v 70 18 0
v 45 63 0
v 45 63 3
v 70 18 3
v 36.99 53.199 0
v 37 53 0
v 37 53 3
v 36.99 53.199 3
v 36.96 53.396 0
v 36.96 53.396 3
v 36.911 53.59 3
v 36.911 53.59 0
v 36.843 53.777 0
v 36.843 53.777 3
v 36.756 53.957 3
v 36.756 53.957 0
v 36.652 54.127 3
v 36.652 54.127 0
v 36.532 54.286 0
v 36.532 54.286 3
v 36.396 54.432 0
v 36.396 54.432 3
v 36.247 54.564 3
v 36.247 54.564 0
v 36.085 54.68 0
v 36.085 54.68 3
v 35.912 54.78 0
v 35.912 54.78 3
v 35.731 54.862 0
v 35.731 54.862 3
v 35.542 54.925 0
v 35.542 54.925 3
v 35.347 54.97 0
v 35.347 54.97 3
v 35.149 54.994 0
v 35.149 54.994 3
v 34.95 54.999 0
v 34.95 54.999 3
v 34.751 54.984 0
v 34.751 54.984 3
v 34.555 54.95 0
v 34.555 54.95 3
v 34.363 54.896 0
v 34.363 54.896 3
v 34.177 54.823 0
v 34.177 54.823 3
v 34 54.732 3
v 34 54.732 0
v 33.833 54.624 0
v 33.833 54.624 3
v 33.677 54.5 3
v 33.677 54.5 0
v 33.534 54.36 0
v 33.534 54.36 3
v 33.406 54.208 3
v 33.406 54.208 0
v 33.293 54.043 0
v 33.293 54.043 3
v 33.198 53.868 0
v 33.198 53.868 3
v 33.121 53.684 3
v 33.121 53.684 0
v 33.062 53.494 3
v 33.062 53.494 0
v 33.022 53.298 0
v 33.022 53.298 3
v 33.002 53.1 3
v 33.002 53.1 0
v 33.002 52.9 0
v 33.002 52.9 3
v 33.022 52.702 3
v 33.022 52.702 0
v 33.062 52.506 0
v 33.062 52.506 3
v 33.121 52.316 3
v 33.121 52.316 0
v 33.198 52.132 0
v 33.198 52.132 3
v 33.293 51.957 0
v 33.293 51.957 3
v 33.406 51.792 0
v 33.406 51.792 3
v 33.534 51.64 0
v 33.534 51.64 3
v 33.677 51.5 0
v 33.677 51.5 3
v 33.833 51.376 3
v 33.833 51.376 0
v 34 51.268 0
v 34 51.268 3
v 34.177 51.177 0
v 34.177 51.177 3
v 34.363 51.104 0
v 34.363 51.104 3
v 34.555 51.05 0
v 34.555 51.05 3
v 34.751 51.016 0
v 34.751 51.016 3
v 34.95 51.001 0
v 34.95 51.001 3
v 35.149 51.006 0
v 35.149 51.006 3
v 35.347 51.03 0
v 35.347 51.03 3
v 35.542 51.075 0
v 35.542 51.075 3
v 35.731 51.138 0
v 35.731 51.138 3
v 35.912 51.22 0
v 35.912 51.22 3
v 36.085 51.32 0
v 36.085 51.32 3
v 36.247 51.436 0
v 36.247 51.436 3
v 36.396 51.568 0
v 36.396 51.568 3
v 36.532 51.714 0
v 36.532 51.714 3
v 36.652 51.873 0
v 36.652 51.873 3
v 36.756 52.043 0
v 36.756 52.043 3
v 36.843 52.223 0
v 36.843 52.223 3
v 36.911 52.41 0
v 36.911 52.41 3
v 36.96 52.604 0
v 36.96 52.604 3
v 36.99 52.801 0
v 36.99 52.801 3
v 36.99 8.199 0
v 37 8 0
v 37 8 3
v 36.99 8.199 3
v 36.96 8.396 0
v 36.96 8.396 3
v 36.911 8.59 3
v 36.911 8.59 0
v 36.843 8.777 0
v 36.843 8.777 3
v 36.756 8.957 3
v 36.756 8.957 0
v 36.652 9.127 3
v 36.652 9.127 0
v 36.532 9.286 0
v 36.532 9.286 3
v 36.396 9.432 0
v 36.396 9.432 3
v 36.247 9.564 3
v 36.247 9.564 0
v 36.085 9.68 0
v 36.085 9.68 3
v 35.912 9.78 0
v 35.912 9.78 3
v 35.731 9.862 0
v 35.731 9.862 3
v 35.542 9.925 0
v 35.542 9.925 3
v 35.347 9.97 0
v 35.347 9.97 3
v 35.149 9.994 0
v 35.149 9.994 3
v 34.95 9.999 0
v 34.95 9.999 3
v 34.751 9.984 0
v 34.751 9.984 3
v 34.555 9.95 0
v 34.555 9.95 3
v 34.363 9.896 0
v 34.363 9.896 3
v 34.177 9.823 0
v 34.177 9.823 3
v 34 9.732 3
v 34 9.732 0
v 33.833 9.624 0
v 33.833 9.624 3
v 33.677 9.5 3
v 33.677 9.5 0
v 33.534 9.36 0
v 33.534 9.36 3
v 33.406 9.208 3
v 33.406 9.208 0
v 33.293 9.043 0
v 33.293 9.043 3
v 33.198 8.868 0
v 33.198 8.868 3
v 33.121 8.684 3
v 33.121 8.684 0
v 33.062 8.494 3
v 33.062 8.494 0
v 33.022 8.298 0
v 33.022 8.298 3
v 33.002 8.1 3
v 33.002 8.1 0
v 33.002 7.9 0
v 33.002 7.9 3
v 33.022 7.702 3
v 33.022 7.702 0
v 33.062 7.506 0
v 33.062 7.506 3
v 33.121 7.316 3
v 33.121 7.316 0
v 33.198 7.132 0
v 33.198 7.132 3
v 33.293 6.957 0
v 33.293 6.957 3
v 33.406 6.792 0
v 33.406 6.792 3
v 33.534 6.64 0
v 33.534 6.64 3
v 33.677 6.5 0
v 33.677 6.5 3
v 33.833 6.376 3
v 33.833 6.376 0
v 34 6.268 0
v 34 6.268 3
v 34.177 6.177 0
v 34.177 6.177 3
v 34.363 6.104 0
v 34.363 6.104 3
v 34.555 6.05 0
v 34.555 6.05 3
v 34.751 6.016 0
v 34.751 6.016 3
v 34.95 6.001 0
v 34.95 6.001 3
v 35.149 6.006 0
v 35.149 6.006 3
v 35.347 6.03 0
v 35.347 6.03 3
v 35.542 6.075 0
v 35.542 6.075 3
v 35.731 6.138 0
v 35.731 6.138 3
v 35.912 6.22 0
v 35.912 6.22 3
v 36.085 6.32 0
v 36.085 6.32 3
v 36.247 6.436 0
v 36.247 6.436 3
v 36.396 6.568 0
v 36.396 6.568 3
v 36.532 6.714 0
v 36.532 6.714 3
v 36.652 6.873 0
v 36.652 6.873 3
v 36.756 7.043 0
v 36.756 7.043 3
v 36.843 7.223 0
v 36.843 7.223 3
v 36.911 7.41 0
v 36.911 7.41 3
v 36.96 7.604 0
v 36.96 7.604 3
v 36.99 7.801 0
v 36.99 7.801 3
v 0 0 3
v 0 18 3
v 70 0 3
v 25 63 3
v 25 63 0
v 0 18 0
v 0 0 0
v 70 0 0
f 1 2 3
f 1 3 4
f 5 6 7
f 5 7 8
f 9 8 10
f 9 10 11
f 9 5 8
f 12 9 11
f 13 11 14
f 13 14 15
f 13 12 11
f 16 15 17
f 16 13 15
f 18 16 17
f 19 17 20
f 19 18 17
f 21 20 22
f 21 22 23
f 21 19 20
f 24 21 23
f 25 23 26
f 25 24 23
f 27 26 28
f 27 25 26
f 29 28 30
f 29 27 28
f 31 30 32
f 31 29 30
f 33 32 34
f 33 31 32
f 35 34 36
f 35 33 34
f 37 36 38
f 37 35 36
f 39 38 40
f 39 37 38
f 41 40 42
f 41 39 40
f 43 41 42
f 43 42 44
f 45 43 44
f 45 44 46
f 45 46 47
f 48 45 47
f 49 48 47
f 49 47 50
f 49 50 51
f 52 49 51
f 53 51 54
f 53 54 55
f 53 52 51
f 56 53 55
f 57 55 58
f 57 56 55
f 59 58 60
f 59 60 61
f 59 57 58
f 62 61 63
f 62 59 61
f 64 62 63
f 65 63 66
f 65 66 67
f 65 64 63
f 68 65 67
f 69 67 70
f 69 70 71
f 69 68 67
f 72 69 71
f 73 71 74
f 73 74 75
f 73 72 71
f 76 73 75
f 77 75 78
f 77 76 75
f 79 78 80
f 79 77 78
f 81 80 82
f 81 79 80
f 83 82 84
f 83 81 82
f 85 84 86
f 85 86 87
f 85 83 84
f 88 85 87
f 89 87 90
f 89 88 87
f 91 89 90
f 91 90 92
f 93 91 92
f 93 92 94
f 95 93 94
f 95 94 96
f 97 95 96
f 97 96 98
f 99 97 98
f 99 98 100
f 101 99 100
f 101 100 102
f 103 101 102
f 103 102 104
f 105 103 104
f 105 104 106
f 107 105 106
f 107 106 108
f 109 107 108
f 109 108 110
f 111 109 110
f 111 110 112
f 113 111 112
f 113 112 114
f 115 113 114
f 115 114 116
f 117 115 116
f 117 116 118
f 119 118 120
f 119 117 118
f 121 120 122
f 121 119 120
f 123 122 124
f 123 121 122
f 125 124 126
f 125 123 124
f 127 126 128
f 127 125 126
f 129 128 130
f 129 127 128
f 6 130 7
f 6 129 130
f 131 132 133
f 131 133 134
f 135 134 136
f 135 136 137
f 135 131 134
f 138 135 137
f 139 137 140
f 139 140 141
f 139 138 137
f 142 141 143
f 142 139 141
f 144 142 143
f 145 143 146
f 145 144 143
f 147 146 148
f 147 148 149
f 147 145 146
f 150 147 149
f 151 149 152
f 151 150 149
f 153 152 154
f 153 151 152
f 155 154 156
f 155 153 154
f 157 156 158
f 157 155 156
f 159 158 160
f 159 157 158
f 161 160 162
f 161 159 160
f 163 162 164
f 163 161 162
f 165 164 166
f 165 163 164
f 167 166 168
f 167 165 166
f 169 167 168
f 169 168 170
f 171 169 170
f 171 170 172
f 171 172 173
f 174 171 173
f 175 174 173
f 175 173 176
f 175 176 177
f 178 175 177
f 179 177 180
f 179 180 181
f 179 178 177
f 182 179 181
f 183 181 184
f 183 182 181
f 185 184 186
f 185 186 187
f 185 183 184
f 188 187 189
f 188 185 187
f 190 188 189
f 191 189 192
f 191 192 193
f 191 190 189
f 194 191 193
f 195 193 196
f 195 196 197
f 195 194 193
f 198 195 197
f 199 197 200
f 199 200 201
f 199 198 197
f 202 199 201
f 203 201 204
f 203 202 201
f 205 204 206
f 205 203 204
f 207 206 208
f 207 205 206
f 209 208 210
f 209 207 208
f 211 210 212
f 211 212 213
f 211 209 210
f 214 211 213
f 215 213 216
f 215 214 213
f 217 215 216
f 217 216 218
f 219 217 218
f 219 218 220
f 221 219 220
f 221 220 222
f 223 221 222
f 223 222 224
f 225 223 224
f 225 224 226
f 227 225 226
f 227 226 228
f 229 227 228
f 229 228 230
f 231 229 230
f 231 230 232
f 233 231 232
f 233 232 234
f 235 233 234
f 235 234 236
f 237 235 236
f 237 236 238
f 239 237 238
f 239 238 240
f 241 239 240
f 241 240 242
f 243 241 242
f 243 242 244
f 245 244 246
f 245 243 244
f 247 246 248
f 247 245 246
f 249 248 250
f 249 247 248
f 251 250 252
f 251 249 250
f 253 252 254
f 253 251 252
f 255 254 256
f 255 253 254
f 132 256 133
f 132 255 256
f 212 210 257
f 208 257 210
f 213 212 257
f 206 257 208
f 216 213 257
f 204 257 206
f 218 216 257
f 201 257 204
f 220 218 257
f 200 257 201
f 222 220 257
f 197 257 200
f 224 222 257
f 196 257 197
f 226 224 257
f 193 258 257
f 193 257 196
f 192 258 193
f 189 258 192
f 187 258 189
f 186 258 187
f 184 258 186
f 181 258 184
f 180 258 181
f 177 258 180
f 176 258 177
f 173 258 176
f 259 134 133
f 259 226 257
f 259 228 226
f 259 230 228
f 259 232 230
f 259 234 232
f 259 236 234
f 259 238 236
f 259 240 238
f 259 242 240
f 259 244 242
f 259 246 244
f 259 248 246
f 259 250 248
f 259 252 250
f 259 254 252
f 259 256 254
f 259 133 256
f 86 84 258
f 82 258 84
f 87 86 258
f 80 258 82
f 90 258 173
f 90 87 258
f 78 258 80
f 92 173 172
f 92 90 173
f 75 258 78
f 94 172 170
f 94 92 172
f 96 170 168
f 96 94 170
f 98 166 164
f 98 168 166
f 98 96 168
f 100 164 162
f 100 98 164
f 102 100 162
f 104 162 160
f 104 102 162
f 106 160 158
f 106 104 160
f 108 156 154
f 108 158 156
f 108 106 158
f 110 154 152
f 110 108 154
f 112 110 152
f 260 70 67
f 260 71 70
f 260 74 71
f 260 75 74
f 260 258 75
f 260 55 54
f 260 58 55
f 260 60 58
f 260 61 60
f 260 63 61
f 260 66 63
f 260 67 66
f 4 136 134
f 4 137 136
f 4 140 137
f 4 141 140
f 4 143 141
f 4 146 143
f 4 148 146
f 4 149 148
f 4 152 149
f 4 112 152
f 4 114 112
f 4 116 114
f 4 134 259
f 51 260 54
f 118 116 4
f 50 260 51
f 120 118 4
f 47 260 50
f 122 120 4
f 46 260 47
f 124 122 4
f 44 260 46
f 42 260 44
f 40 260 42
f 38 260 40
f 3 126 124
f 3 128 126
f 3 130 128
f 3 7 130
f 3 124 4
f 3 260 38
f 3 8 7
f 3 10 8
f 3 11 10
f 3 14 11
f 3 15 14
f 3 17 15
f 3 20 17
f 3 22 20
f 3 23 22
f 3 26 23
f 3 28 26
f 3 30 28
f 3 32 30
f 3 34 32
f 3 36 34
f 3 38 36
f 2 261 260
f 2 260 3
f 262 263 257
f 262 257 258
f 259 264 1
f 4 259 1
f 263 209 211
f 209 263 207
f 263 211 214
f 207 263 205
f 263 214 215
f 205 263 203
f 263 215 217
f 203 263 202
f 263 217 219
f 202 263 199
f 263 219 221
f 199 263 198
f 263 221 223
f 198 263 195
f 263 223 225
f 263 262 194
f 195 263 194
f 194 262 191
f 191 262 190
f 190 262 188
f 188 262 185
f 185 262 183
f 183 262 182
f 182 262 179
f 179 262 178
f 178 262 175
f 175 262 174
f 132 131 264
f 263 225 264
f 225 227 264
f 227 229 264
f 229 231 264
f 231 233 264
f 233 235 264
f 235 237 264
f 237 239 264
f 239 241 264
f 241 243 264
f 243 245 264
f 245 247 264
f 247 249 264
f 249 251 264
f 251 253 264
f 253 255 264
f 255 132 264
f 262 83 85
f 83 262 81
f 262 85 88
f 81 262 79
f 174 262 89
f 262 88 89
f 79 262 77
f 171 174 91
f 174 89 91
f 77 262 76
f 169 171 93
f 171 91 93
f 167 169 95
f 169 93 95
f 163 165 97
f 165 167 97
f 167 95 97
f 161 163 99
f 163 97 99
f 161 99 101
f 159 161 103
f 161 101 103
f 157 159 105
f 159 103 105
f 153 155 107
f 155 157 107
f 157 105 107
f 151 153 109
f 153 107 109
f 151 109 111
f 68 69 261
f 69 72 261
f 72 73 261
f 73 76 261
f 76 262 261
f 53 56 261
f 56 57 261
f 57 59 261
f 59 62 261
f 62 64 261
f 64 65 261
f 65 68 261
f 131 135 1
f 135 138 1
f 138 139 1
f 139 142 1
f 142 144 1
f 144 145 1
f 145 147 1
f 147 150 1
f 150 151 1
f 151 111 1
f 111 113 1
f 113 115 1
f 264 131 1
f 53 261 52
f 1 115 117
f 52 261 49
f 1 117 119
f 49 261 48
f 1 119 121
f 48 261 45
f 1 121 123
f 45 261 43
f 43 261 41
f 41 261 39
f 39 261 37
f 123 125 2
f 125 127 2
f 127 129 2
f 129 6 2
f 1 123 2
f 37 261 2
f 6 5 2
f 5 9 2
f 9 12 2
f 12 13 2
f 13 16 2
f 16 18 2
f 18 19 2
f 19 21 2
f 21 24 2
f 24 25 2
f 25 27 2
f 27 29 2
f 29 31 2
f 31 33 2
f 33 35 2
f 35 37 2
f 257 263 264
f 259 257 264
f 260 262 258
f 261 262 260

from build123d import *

# Parameters (mm, degrees)
IZIM1_R                     = 2
IZIM1_W                     = 70
IZIM1_H                     = 18
Y_KSEKLIK_EKSTR_ZYON1_DEPTH = 3


with BuildPart() as part:
    # Çizim1 → Yükseklik-Ekstrüzyon1 (new body)
    # profile 1 of 2: a face of its own
    with BuildSketch(Plane.XY):
        Polygon((45, 63), (70, 18), (0, 18), (25, 63), align=None)
        with Locations((35, 53)):
            Circle(IZIM1_R, mode=Mode.SUBTRACT)
    # profile 2 of 2: a face of its own
    with BuildSketch(Plane.XY):
        with Locations((35, 9)):
            Rectangle(IZIM1_W, IZIM1_H)
        with Locations((35, 8)):
            Circle(IZIM1_R, mode=Mode.SUBTRACT)
    extrude(amount=Y_KSEKLIK_EKSTR_ZYON1_DEPTH)


solid = part.part
